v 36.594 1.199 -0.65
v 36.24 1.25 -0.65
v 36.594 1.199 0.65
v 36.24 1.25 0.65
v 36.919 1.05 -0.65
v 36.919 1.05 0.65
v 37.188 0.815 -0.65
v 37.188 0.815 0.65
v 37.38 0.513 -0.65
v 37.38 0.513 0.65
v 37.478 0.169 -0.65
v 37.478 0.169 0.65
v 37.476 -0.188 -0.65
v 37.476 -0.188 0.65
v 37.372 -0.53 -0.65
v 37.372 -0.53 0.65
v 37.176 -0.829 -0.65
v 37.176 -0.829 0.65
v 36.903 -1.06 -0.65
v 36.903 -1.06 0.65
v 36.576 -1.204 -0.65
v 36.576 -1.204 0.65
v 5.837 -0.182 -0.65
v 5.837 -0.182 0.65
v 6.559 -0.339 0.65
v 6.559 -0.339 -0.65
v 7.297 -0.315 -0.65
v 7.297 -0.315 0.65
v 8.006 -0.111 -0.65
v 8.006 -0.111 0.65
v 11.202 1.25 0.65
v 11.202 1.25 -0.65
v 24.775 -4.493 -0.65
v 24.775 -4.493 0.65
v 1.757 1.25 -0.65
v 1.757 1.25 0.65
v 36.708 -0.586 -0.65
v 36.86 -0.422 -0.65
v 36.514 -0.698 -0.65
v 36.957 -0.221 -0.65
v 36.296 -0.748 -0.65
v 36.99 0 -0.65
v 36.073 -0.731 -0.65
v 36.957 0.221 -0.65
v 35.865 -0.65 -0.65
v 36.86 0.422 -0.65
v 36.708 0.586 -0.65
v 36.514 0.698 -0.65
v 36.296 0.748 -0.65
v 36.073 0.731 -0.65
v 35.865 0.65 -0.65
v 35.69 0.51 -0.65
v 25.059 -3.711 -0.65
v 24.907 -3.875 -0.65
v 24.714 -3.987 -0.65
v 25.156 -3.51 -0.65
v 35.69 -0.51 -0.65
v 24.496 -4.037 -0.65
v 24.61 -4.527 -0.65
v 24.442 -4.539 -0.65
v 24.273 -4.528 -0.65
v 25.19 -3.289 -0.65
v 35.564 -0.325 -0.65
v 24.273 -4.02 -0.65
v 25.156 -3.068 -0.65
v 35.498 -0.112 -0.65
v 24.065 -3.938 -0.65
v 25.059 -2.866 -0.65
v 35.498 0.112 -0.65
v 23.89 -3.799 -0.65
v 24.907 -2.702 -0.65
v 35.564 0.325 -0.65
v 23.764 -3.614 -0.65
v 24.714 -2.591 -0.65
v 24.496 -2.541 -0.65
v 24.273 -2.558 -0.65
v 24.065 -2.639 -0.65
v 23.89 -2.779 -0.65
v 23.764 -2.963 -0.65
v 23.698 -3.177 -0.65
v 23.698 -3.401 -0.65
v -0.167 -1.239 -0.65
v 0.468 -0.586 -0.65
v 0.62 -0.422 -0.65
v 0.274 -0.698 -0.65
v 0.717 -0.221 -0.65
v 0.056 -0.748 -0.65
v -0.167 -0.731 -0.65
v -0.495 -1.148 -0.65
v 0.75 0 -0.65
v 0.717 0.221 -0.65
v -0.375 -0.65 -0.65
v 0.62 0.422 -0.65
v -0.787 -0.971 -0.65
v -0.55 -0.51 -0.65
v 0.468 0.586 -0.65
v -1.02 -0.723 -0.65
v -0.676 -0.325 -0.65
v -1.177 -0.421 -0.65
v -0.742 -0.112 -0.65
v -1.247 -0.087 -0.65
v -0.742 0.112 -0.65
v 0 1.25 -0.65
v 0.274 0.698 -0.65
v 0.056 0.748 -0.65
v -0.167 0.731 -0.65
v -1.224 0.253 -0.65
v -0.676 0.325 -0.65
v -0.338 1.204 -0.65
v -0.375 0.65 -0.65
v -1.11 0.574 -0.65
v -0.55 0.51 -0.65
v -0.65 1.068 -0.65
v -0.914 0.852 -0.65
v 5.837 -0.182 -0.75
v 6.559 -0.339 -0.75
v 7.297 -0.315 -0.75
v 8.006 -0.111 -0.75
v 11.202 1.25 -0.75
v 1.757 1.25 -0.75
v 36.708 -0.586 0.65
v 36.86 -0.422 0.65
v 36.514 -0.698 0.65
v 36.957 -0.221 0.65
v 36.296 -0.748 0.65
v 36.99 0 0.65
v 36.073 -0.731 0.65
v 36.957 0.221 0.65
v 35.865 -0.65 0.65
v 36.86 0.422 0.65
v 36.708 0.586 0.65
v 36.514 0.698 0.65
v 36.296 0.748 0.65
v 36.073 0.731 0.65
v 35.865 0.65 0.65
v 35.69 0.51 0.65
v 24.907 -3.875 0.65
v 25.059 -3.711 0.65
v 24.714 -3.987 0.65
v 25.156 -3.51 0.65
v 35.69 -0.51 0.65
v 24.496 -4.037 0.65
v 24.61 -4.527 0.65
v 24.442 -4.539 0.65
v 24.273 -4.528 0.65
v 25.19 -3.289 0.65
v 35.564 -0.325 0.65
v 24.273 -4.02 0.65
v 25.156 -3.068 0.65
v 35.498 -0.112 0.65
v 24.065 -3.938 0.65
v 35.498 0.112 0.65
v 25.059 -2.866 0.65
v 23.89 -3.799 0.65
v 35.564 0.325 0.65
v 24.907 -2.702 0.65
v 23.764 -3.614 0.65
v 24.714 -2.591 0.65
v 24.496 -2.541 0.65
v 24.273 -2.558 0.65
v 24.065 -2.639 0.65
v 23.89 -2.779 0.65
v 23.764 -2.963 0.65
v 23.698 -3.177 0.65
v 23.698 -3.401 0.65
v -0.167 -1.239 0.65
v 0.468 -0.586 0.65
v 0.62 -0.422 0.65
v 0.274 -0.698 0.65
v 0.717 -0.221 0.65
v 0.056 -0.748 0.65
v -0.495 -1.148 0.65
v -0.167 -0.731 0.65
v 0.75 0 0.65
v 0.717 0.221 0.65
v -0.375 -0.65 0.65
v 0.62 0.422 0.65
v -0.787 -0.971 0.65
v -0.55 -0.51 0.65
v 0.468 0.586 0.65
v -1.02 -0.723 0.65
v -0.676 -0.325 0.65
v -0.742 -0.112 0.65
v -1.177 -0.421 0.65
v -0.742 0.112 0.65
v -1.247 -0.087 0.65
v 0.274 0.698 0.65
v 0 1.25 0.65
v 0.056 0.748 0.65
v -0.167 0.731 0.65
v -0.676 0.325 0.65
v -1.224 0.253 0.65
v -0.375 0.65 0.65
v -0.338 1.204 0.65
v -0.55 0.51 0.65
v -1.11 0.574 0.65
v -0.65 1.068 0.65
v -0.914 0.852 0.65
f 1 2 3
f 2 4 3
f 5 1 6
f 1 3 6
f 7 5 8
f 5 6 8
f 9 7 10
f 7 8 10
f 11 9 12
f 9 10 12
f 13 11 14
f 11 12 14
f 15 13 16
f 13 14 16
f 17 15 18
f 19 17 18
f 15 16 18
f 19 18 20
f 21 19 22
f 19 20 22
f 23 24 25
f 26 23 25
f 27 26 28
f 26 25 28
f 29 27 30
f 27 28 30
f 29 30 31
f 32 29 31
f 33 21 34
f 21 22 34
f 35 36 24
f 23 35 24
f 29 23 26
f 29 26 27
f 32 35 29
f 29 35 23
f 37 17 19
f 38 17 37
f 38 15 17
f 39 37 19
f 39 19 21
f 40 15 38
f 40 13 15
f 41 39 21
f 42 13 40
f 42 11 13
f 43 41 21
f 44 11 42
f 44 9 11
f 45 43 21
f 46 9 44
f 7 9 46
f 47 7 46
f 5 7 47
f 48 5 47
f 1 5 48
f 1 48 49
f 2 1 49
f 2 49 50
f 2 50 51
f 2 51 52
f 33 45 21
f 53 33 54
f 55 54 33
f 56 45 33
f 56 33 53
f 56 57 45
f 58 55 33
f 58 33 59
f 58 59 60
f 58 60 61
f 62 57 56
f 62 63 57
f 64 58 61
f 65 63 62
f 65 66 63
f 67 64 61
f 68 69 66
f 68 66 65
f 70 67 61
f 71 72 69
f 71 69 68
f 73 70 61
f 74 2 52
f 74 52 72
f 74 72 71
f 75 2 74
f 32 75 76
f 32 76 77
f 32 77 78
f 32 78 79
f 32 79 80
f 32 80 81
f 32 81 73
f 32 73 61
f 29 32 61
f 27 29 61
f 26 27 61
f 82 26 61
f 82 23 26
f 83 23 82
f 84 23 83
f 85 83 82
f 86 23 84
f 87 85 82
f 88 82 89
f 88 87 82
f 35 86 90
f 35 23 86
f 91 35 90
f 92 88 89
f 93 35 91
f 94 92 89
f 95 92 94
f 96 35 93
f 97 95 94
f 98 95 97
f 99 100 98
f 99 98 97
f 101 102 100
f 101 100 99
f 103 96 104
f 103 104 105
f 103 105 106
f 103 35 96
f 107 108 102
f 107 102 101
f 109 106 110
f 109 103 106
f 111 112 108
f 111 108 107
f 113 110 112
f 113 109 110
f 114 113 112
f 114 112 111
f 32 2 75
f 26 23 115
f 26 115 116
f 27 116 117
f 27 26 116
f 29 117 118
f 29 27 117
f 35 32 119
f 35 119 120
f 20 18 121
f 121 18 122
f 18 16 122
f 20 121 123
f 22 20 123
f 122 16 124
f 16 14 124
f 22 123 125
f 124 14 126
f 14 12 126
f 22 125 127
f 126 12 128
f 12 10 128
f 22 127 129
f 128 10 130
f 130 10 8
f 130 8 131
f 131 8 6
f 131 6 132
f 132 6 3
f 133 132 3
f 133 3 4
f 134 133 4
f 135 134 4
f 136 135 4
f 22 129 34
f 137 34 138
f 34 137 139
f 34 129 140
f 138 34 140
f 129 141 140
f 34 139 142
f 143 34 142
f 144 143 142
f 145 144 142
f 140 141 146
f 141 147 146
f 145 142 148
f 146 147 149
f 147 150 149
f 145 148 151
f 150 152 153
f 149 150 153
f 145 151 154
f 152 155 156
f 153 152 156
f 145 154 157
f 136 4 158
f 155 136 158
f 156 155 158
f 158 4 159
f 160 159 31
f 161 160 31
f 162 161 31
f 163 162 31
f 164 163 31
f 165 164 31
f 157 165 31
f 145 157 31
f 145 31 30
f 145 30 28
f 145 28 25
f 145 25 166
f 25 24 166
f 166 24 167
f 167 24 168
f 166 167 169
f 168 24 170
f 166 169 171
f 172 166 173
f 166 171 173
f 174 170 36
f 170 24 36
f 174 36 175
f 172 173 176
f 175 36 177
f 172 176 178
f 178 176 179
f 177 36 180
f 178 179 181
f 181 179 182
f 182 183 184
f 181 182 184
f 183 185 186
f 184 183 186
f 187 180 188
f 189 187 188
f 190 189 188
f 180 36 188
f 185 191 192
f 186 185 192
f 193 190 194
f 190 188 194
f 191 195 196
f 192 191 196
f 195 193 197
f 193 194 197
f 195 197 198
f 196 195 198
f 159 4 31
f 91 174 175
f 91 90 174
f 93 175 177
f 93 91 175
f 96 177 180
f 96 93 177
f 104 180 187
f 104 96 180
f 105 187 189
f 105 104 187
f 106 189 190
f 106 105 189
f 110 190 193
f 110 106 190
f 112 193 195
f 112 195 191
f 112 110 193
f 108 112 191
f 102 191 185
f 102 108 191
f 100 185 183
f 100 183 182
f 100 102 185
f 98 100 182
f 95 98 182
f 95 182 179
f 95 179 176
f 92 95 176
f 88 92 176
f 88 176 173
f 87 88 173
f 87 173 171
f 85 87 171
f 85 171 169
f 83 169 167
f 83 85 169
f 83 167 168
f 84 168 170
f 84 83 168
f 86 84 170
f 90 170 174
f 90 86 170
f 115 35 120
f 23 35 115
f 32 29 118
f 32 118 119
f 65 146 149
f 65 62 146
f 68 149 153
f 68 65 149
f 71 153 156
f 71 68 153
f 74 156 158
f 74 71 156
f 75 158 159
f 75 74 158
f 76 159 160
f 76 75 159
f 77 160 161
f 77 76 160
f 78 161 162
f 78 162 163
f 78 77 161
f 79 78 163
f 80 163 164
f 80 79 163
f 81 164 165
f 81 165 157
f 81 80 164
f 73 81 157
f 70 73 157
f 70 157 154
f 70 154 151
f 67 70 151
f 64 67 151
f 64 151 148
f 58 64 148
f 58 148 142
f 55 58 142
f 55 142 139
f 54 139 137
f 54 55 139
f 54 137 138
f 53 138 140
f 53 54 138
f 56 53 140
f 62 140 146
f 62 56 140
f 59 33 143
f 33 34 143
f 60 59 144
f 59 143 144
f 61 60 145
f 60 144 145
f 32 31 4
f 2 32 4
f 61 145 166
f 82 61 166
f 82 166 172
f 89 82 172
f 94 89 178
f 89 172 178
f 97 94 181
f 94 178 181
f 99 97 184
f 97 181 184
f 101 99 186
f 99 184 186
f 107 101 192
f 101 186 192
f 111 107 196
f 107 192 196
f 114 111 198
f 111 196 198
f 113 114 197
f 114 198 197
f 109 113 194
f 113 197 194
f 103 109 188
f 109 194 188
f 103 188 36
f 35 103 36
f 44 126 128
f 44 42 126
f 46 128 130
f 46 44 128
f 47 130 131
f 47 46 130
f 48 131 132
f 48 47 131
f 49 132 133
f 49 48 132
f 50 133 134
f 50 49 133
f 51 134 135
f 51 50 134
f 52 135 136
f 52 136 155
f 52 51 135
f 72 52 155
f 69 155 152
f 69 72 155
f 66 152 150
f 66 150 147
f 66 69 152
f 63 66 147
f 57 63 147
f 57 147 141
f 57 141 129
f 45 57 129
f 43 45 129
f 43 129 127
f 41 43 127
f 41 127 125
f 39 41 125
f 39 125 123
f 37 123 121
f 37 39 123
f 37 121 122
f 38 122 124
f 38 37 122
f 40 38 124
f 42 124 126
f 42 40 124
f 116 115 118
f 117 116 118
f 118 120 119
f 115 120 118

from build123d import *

# Parameters (mm, degrees)
SKETCH_1_R          = 0.75
EXTRUDE_1_DEPTH     = 0.65
CUT_EXTRUDE_1_DEPTH = 10
EXTRUDE_3_DEPTH     = 0.1


with BuildPart() as part:
    # 草圖1 → 填料-伸長1 (new, symmetric)
    with BuildSketch(Plane.XY):
        with BuildLine():
            Line((0, 1.25), (36.24, 1.25))
            ThreePointArc((36.24, 1.25), (37.478474488, 0.169354485), (36.575585934, -1.204110494))
            Line((36.575585934, -1.204110494), (24.775303098, -4.492852651))
            ThreePointArc((24.775303098, -4.492852651), (24.525924375, -4.535765941), (24.273012877, -4.527576158))
            Line((24.273012877, -4.527576158), (-0.166704286, -1.238834001))
            ThreePointArc((-0.166704286, -1.238834001), (-1.247205376, 0.083538911), (0, 1.25))
        make_face()
        Circle(SKETCH_1_R, mode=Mode.SUBTRACT)
        with Locations((36.24, 0)):
            Circle(SKETCH_1_R, mode=Mode.SUBTRACT)
        with Locations((24.439717163, -3.288742157)):
            Circle(SKETCH_1_R, mode=Mode.SUBTRACT)
    extrude(amount=EXTRUDE_1_DEPTH, both=True)

    # 草圖2 → 除料-伸長1 (cut)
    with BuildSketch(Plane.XY.offset(0.65)):
        with BuildLine():
            Line((1.757329147, 1.25), (5.83713676, -0.181882718))
            ThreePointArc((5.83713676, -0.181882718), (6.928296403, -0.349573027), (8.006230293, -0.111228877))
            Line((8.006230293, -0.111228877), (11.20211131, 1.25))
            Line((11.20211131, 1.25), (1.757329147, 1.25))
        make_face()
    extrude(amount=-CUT_EXTRUDE_1_DEPTH, mode=Mode.SUBTRACT)


with BuildPart() as body_2:
    # 草圖4 → 填料-伸長3 (new body)
    with BuildSketch(Plane(origin=(0, 0, -0.65), x_dir=(-1, 0, 0), z_dir=(0, 0, -1))):
        with BuildLine():
            Line((-8.006230293, -0.111228877), (-11.20211131, 1.25))
            Line((-11.20211131, 1.25), (-1.757329147, 1.25))
            Line((-1.757329147, 1.25), (-5.83713676, -0.181882718))
            ThreePointArc((-5.83713676, -0.181882718), (-6.928296403, -0.349573027), (-8.006230293, -0.111228877))
        make_face()
    extrude(amount=EXTRUDE_3_DEPTH)


solid = Compound([part.part, body_2.part])
